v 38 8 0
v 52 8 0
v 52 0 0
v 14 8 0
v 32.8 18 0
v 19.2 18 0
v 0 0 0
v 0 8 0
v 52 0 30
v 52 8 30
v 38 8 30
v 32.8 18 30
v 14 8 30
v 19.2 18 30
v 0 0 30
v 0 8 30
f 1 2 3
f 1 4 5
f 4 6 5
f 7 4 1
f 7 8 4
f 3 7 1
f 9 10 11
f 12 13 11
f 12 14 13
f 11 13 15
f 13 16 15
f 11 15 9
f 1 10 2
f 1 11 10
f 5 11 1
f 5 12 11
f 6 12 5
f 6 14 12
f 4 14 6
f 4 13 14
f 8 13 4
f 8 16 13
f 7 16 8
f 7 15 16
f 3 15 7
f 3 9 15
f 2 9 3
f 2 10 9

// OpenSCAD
$fn = 32;

// ----------------------------------------------------------------------
// V guide rail: dovetail, 52 mm wide
// ----------------------------------------------------------------------

// --- parameters (mm) ---
rail_w = 52;              // rail width, X
base_t = 8;               // base plate thickness
v_depth = 10;             // V feature depth / height
v_half_w = 12;            // half width of the V at the base face
plate_t = 30;             // rail length, Z (the extrusion height)
top_half_w = 6.8;         // half width at the dovetail top

dovetail_base = 2 * v_half_w;  // dovetail width at the base
dovetail_top = 2 * top_half_w;  // dovetail width at the top

profile = [[0, 0], [52, 0], [52, 8], [38, 8], [32.8, 18], [19.2, 18], [14, 8], [0, 8]];  // primary outline, 8 points, counter clockwise

// --- the one profile operation ---
linear_extrude(height = plate_t) polygon(points = profile);
